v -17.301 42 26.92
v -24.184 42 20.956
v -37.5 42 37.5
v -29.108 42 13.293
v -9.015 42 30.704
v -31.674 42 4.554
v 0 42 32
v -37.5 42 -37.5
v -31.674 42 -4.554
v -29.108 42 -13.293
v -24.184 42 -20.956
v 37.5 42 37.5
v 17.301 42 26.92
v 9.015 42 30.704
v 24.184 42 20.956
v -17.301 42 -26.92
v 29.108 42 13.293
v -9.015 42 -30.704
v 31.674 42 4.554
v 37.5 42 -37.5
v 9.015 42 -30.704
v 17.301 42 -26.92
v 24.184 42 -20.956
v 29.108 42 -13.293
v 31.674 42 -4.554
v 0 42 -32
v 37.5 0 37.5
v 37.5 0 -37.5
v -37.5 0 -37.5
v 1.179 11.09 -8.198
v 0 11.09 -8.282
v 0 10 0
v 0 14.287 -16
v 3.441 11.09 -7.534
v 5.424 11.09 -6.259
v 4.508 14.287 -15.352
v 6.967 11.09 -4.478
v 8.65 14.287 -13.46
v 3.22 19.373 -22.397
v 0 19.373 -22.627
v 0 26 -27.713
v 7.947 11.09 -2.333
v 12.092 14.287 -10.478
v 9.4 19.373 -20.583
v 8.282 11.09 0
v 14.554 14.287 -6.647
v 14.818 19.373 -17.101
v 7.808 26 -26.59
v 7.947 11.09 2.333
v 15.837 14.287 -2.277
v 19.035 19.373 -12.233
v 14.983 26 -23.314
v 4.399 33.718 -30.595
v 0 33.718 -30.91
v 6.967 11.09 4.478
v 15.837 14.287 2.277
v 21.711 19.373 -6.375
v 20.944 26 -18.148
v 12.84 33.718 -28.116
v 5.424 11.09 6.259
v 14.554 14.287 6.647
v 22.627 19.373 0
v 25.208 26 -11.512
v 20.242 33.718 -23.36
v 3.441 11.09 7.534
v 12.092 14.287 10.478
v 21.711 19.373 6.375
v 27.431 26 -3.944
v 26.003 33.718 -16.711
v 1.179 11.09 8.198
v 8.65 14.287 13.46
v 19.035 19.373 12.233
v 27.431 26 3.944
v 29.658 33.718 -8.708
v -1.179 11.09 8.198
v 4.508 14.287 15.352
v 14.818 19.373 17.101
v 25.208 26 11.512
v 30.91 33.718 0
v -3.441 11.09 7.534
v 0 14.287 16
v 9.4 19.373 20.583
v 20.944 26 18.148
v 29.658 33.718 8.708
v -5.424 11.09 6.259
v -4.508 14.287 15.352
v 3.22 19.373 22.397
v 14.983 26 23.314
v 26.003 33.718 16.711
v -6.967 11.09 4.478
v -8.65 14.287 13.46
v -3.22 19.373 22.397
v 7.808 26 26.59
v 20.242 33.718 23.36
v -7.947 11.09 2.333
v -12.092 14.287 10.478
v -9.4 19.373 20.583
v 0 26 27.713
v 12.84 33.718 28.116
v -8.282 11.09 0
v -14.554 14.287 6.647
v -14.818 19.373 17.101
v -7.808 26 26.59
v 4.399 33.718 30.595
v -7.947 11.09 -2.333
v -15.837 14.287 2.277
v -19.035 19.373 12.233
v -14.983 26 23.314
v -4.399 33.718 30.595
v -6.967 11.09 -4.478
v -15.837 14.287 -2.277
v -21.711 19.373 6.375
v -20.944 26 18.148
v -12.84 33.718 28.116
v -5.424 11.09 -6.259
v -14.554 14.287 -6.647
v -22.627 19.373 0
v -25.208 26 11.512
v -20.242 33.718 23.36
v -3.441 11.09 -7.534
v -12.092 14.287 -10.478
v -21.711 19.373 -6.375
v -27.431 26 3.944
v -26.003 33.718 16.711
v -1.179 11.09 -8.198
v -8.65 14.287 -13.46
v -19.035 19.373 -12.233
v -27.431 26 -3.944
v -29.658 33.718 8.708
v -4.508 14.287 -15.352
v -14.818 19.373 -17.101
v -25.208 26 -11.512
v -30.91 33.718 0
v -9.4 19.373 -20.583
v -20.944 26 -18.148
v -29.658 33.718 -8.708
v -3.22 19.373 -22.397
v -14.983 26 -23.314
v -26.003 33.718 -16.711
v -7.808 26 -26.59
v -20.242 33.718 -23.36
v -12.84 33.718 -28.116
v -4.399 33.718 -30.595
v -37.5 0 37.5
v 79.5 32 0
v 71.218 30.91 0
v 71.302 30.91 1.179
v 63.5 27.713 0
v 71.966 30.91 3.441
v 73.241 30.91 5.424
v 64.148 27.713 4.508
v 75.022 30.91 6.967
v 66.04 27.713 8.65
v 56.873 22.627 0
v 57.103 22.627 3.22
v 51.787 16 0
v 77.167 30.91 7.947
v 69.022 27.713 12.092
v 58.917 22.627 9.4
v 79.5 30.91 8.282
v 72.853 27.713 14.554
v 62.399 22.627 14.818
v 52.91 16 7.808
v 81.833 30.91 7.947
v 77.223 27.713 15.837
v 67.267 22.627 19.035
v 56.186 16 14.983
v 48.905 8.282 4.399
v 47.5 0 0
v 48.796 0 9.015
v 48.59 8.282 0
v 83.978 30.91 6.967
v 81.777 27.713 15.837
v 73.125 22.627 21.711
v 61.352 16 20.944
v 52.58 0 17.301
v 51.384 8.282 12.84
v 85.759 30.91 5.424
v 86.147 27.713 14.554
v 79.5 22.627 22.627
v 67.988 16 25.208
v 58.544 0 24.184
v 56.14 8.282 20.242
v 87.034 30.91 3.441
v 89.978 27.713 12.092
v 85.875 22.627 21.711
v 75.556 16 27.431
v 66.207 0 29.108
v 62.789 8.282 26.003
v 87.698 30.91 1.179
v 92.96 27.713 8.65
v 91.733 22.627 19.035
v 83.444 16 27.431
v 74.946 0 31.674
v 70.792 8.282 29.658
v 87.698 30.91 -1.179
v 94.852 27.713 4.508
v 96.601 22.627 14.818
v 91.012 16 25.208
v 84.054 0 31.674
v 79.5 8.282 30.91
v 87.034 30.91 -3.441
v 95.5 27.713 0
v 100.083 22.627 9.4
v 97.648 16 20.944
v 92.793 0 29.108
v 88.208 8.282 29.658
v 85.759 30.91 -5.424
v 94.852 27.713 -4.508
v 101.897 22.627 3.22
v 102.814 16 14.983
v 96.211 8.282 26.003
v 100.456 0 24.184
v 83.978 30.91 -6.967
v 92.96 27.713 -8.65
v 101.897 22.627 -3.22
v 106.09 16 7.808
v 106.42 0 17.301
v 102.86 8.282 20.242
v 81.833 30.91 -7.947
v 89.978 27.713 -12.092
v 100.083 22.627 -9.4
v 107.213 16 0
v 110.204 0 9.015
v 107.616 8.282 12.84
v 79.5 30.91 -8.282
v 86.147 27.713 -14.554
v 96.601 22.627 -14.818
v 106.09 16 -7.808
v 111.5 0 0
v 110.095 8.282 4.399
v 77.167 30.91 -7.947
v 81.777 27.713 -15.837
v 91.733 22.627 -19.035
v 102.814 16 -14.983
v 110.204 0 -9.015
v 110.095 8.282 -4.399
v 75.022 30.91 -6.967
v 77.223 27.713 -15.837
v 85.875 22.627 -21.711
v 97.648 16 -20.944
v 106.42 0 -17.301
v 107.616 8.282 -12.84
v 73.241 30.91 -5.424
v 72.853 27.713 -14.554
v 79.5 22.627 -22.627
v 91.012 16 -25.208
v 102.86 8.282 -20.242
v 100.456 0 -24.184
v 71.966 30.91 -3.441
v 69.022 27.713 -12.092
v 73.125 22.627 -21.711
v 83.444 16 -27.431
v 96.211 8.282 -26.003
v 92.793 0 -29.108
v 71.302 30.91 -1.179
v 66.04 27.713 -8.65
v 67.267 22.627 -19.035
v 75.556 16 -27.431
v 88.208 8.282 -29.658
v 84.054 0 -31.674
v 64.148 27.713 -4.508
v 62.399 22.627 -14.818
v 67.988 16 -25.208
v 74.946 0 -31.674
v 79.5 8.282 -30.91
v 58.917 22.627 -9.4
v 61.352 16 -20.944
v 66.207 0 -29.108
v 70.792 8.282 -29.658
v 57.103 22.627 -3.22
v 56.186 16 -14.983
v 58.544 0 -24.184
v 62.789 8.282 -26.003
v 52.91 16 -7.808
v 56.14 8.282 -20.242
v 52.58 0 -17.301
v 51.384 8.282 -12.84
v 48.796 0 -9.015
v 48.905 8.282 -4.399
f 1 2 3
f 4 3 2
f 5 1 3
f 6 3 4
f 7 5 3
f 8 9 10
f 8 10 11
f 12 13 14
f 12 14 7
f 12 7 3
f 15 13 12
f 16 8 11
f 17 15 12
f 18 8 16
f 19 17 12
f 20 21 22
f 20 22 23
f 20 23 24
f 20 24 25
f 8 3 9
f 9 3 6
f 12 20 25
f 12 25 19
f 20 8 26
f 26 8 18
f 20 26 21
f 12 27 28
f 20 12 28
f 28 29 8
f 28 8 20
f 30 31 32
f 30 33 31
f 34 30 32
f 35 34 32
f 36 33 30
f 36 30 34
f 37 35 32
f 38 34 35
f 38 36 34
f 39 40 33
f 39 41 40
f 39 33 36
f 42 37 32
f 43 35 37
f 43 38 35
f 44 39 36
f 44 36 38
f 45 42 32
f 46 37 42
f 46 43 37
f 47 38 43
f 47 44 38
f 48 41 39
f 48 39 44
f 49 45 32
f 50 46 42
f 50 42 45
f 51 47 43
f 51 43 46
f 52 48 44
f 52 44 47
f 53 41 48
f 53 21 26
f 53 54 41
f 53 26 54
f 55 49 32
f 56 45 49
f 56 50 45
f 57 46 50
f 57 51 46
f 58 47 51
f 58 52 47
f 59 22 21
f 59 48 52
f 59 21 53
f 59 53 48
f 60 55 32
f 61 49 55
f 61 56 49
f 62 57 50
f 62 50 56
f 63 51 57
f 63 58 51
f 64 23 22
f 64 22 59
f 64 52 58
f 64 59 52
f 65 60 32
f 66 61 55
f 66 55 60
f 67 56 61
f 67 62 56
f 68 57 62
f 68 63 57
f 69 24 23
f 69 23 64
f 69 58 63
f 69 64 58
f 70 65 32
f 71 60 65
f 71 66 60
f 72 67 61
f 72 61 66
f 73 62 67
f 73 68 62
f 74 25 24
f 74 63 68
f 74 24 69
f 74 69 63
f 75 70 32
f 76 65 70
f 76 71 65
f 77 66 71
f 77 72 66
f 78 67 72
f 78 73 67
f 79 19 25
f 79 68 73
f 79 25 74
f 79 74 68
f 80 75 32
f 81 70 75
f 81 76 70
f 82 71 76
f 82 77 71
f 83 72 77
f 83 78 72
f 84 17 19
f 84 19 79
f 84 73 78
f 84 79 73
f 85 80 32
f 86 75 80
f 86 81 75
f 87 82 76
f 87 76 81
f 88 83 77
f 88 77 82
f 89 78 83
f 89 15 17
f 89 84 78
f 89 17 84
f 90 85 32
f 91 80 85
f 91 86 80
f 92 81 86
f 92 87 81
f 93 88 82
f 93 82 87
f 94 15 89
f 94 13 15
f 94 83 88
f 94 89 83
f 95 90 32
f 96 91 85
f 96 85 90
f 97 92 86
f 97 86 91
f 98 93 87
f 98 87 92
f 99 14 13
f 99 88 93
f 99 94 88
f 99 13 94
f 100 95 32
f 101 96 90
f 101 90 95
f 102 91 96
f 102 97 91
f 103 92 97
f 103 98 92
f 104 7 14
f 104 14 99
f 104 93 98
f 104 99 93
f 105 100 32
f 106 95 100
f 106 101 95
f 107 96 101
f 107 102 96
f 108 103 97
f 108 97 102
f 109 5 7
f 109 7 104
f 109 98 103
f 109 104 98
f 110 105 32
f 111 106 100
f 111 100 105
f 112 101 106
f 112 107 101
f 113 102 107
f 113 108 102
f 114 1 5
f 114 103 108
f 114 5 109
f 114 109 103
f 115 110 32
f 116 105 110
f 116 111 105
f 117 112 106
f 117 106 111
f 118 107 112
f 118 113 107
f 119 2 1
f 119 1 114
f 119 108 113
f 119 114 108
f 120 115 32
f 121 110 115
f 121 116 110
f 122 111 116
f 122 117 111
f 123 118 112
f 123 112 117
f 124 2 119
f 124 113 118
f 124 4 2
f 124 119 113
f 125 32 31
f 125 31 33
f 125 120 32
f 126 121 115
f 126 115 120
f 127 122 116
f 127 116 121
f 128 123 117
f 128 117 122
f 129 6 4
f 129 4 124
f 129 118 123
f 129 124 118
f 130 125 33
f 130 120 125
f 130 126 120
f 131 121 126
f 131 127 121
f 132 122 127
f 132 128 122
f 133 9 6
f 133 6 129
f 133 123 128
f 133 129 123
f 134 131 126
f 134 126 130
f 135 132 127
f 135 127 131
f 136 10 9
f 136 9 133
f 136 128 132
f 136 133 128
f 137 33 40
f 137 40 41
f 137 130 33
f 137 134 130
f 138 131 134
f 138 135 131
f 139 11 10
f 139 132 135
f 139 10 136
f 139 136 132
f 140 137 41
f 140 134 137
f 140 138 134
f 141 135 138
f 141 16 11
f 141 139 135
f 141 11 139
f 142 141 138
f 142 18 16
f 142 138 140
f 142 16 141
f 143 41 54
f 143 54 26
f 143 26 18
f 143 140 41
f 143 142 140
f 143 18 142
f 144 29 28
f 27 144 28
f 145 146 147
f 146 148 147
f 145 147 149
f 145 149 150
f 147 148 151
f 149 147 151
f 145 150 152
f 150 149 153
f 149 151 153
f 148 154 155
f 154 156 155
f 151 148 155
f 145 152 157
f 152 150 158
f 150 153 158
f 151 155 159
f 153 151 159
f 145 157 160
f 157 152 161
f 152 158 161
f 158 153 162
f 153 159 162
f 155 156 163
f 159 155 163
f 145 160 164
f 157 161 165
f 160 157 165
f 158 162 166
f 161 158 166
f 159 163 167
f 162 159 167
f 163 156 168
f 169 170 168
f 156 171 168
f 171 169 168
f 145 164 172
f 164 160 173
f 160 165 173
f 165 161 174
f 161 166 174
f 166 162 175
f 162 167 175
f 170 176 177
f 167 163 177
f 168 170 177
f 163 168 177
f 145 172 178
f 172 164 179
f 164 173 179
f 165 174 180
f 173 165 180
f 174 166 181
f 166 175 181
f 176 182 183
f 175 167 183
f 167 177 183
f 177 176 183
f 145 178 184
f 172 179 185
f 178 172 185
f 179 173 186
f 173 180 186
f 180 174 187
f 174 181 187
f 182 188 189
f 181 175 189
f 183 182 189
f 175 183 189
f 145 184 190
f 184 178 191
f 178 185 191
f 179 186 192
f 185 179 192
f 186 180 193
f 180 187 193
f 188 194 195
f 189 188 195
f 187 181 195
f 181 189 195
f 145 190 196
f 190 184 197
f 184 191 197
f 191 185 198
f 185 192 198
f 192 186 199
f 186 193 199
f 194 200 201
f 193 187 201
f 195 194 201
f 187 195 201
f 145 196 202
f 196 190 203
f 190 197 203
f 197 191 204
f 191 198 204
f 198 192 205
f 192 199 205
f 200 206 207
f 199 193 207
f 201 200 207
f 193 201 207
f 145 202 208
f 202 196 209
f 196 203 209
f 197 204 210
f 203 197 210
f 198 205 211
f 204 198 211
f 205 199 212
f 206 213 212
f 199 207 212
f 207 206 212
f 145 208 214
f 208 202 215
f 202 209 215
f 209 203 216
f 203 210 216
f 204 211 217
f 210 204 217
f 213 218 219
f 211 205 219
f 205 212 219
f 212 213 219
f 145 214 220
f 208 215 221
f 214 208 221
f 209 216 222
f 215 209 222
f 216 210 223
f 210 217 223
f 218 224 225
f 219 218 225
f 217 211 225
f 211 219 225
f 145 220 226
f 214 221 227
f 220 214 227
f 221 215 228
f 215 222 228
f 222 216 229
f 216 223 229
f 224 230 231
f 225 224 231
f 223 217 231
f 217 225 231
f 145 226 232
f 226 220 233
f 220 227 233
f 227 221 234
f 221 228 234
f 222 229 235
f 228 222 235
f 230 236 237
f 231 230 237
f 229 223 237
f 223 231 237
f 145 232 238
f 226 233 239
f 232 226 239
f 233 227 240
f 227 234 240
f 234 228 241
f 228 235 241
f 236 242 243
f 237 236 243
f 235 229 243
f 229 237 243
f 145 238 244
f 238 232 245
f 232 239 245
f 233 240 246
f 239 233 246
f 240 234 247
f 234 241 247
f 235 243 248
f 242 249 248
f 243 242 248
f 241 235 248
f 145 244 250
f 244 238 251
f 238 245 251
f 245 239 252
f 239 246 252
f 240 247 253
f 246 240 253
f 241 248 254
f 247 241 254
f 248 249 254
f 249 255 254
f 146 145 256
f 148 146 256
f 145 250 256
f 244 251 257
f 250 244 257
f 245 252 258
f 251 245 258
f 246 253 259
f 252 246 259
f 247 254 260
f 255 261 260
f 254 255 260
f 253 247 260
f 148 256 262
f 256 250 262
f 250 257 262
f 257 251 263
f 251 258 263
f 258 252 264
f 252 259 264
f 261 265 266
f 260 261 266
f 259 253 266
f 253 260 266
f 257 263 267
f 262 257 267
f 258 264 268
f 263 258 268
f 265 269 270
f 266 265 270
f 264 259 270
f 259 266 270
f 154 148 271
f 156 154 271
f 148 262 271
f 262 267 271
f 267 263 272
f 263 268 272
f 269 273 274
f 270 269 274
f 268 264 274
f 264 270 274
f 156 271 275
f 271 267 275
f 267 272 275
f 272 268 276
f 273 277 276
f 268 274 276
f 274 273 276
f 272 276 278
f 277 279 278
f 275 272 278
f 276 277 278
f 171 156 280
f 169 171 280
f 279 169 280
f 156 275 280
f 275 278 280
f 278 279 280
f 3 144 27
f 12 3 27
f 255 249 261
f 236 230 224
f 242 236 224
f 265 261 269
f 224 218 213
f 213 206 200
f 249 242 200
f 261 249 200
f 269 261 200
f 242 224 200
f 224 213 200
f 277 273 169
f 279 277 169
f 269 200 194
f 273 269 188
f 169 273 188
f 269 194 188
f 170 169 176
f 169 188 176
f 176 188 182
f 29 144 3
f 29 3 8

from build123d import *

# Parameters (mm, degrees)
SKETCH2_W           = 75
SKETCH2_H           = 75
BOSS_EXTRUDE2_DEPTH = 42


with BuildPart() as part:
    # Sketch2 → Boss-Extrude2 (new body)
    with BuildSketch(Plane(origin=(0, 0, 0), x_dir=(1, 0, 0), z_dir=(0, 1, 0))):
        Rectangle(SKETCH2_W, SKETCH2_H)
    extrude(amount=BOSS_EXTRUDE2_DEPTH)

    # Sketch4 → Cut-Revolve2 (revolve, cut)
    with BuildSketch(Plane(origin=(0, 0, 0), x_dir=(0, 0, -1), z_dir=(1, 0, 0))):
        with BuildLine():
            Line((0, 42), (0, 10))
            ThreePointArc((0, 10), (22.627416998, 19.372583002), (32, 42))
            Line((32, 42), (0, 42))
        make_face()
    revolve(axis=Axis((0, 42, 0), (0, -1, 0)), mode=Mode.SUBTRACT)


with BuildPart() as body_2:
    # Sketch6 → Revolve1 (revolve)
    with BuildSketch(Plane.XY):
        with BuildLine():
            Line((47.5, 0), (79.5, 0))
            Line((79.5, 0), (79.5, 32))
            ThreePointArc((79.5, 32), (56.872583002, 22.627416998), (47.5, 0))
        make_face()
    revolve(axis=Axis((79.5, 0, 0), (0, 1, 0)))


solid = Compound([part.part, body_2.part])
